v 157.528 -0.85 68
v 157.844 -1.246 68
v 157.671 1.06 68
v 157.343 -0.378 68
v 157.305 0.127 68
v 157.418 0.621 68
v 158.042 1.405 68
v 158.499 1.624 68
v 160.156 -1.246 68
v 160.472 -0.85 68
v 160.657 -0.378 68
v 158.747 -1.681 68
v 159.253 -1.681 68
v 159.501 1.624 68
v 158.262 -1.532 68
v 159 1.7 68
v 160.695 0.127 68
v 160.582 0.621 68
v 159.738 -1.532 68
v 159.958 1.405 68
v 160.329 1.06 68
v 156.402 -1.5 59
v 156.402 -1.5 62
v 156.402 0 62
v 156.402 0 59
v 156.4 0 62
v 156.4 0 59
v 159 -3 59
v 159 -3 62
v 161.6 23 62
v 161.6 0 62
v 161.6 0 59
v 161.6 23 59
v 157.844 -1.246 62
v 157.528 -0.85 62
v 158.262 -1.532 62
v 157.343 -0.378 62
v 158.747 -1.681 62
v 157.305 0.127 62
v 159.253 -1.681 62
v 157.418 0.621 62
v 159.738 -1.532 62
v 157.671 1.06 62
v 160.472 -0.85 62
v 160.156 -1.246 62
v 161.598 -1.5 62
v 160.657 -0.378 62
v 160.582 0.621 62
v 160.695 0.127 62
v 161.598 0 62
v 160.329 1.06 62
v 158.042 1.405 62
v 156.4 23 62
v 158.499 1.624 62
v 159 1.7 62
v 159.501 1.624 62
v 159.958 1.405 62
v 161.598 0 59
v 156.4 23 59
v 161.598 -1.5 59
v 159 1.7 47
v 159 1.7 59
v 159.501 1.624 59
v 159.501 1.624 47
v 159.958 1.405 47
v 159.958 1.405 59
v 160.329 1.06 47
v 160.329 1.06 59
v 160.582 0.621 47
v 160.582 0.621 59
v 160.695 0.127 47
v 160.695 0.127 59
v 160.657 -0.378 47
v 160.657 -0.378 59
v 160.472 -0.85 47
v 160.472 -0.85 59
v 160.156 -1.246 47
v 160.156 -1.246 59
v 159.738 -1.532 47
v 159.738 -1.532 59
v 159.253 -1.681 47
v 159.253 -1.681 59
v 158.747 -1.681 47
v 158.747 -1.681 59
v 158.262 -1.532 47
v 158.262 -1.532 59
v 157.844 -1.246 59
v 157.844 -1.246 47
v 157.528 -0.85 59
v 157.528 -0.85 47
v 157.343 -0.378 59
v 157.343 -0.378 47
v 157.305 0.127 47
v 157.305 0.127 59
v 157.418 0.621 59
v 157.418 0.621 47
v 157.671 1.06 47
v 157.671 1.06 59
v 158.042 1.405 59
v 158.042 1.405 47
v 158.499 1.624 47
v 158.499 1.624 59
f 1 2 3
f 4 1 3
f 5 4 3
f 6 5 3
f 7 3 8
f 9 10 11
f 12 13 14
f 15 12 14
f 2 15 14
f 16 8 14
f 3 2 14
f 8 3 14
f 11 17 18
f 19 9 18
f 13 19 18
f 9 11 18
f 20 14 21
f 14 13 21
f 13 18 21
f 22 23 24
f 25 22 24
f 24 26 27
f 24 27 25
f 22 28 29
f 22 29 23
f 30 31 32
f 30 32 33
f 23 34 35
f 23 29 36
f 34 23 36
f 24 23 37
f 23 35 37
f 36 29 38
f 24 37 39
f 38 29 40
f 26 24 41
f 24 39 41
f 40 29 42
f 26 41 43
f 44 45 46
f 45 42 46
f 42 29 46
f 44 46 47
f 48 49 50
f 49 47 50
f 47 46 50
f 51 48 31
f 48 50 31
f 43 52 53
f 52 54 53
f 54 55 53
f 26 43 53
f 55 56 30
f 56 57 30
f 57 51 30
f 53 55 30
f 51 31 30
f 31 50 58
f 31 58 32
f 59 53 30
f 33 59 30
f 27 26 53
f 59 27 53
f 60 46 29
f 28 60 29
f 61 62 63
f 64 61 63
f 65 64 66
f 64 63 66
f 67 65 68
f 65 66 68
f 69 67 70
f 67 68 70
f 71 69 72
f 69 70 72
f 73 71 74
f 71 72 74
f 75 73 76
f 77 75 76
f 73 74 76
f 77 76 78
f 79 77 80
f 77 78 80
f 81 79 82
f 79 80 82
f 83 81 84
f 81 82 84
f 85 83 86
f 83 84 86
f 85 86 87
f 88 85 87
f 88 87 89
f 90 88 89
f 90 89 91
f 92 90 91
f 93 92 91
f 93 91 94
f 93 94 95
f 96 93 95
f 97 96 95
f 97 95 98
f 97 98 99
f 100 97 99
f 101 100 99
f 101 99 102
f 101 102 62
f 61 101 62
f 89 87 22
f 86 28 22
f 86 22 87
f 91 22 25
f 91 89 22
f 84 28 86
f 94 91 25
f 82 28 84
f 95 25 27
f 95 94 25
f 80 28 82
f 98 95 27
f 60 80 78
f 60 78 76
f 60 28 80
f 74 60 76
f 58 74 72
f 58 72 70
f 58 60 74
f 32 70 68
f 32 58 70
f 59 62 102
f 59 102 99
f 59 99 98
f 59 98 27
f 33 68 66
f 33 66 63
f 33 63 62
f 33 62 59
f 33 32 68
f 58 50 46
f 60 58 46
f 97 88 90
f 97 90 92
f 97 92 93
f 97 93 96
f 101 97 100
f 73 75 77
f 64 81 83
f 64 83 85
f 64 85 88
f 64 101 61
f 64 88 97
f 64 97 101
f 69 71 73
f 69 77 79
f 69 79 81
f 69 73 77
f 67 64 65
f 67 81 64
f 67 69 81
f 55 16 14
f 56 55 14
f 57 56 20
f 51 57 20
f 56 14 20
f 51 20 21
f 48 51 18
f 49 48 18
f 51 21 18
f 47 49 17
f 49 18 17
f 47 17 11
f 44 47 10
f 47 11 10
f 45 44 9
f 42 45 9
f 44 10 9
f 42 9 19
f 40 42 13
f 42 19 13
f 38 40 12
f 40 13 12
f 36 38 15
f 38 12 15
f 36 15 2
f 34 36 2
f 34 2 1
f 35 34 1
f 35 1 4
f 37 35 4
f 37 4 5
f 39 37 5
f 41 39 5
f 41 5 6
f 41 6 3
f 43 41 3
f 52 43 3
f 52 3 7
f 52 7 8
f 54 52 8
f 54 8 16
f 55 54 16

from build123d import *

# Parameters (mm, degrees)
CYLINDER025_R             = 1.7
CYLINDER025_DEPTH         = 21
BOX006_W                  = 23
BOX006_H                  = 5.2
BOX006_DEPTH              = 3
PRISM002_DEPTH            = 3
FUSION008_ROLL_ANGLE      = 180
FUSION008_PLACEMENT_ANGLE = 90


with BuildPart() as cilindro025:
    # Cylinder025 → Cylinder025 (new body)
    with BuildSketch(Plane.XY.offset(-6)):
        Circle(CYLINDER025_R)
    extrude(amount=CYLINDER025_DEPTH)


with BuildPart() as cubo005:
    # Box006 → Box006 (new body)
    with BuildSketch(Plane(origin=(0, -2.6, 0), x_dir=(1, 0, 0), z_dir=(0, 0, 1))):
        with Locations((11.5, 2.6)):
            Rectangle(BOX006_W, BOX006_H)
    extrude(amount=BOX006_DEPTH)


with BuildPart() as hueco_tornillo002:
    # Prism002 → Prism002 (new body)
    with BuildSketch(Plane.XY):
        Polygon((3, 0), (1.5, 2.598076), (-1.5, 2.598076), (-3, 0), (-1.5, -2.598076), (1.5, -2.598076), align=None)
    extrude(amount=PRISM002_DEPTH)

    # Fusion008: union Cilindro025, Cubo005
    add(cilindro025.part)
    add(cubo005.part)


with BuildPart() as hueco_tornillo002_1:
    # Fusion008 roll: moved
    add(hueco_tornillo002.part.rotate(Axis((0, 0, 0), (1, 0, 0)), FUSION008_ROLL_ANGLE))


with BuildPart() as hueco_tornillo002_2:
    # Fusion008 placement: moved
    add(hueco_tornillo002_1.part.moved(Location((159, 0, 62))).rotate(Axis((159, 0, 62), (0, 0, 1)), FUSION008_PLACEMENT_ANGLE))


solid = hueco_tornillo002_2.part
